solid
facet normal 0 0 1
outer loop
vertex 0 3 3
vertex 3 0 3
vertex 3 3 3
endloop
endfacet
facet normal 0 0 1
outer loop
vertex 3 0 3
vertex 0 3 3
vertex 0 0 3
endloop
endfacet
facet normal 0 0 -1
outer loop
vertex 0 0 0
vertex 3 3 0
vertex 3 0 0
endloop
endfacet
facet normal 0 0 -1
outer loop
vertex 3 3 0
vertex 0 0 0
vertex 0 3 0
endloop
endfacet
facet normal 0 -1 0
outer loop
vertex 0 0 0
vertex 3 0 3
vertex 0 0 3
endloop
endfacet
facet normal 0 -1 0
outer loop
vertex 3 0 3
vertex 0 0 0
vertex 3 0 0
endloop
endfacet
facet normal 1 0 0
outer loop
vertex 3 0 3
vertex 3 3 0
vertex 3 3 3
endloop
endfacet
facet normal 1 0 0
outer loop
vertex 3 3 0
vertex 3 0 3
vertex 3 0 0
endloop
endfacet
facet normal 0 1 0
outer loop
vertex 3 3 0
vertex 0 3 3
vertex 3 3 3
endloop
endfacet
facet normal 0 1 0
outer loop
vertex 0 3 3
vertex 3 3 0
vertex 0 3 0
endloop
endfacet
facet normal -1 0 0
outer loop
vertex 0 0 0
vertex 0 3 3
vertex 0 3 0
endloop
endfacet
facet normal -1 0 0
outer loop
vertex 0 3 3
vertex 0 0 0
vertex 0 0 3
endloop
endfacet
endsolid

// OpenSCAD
// render() forces eager CGAL evaluation of a subtree. On the EXPORT path the
// whole tree is CGAL-evaluated anyway, so it changes nothing: verified at
// openscad 2026.08.07, `render() cube(3);` exports BYTE-IDENTICAL ASCII STL to
// `cube(3);`. OpenSCAD still writes it into the .csg as `render(convexity = 1)`.
render() cube([3, 3, 3]);
